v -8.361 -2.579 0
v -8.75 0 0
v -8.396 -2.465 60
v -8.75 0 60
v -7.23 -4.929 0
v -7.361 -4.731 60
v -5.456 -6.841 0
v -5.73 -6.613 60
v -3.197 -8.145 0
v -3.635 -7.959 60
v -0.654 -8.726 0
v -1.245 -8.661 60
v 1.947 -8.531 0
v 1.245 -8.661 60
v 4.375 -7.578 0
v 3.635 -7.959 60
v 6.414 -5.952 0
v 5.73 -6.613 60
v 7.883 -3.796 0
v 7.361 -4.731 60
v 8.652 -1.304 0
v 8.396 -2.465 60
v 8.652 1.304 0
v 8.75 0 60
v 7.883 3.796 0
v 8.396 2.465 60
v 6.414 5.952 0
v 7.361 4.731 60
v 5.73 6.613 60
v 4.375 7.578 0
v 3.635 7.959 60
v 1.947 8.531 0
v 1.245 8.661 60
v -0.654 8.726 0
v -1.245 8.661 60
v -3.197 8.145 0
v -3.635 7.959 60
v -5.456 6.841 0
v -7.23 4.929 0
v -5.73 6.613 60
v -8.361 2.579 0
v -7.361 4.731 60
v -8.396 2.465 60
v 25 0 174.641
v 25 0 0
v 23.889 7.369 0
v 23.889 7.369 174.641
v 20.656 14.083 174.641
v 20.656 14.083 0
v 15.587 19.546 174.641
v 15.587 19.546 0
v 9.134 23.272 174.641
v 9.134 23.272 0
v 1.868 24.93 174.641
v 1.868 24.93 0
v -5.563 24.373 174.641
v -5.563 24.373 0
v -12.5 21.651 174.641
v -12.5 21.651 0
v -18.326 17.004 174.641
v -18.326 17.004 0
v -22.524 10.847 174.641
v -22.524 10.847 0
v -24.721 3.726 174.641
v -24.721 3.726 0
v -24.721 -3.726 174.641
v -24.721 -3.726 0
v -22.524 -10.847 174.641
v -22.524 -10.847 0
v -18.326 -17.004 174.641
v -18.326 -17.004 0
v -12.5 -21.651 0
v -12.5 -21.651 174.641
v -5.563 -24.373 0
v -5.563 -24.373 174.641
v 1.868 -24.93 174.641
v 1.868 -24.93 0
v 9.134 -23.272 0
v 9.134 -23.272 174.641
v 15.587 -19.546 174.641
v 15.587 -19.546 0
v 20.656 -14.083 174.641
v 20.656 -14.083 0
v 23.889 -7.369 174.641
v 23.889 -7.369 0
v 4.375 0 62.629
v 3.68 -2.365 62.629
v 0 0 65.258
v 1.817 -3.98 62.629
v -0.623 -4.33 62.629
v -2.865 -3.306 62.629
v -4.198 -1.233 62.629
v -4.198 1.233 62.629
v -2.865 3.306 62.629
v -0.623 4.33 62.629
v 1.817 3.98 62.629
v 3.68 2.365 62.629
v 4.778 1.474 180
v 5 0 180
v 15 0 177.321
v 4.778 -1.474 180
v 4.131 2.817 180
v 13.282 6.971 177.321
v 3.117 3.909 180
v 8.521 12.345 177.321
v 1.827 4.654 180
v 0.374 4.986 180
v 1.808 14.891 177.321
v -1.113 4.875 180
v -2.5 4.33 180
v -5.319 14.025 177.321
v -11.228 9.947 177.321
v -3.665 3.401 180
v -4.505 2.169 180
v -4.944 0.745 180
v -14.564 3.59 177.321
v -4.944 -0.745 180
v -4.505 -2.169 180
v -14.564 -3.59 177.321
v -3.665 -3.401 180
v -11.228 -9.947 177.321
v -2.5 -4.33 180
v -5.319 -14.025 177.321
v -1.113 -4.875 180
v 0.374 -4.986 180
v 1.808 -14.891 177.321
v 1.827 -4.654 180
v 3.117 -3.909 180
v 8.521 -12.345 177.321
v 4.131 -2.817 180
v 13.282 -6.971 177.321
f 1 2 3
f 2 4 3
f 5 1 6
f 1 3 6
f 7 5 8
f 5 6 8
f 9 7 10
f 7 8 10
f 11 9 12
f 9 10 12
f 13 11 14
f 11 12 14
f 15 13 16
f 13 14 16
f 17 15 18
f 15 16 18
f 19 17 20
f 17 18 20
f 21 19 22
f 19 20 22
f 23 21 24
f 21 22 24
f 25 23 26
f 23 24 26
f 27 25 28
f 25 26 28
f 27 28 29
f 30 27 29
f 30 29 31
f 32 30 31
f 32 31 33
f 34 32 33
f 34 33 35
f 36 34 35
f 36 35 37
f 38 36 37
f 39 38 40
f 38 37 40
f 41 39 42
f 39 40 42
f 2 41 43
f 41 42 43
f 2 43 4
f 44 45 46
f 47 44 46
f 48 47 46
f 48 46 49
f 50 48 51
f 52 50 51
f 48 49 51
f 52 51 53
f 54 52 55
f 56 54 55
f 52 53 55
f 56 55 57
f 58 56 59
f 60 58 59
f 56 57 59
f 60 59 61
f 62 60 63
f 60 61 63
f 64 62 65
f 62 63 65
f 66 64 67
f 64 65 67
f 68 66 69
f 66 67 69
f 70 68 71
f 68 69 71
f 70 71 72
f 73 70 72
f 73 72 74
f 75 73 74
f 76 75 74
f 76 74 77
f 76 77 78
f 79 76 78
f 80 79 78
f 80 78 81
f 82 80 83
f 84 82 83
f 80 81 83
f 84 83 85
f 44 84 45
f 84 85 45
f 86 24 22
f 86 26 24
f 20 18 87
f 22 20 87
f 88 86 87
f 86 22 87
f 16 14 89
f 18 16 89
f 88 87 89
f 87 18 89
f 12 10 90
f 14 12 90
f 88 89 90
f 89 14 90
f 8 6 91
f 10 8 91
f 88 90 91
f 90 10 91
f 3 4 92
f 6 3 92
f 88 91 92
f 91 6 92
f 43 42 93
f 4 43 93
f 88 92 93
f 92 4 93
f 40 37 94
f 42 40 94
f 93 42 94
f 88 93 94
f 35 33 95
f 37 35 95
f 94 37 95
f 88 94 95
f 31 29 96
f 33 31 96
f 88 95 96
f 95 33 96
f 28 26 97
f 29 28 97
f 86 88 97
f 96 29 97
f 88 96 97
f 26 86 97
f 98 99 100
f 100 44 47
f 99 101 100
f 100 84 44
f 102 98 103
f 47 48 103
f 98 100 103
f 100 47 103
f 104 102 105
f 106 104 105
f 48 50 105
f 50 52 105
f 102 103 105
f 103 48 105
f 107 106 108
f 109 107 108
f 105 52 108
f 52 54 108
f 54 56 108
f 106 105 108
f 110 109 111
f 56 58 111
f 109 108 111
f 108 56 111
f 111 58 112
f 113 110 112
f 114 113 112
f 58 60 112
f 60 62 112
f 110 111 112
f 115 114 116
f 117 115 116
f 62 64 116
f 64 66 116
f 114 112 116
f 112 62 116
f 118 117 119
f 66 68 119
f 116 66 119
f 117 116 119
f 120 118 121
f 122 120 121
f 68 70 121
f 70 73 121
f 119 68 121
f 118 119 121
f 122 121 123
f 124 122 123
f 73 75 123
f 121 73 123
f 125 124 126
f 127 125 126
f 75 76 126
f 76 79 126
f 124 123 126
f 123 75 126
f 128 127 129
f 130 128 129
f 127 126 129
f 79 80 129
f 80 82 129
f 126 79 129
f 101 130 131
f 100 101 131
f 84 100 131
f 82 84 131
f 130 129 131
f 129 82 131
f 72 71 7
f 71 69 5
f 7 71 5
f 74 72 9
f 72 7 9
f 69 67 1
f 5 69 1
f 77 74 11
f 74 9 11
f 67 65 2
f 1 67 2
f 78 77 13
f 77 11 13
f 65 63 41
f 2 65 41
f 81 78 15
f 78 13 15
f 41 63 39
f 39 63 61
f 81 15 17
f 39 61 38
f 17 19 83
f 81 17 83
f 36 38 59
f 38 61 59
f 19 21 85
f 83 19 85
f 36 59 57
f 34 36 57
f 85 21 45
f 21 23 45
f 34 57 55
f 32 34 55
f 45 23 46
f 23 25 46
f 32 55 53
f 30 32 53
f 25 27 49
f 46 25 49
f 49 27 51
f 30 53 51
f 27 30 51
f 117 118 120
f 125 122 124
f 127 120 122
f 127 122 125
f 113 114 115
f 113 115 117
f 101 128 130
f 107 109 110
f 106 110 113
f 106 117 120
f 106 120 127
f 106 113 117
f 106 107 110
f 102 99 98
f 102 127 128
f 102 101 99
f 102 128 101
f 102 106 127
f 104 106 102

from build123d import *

# Parameters (mm, degrees)
F0_R     = 25
F1_DEPTH = 180
F2_SIZE2 = 5.3589838486
F2_SIZE  = 20
F4_D     = 17.5
F4_DEPTH = 60
F4_TIP   = 5.2575304165


with BuildPart() as f1:
    # F0 (on Top) → F1 (new body)
    with BuildSketch(Plane.XY):
        Circle(F0_R)
    extrude(amount=F1_DEPTH)

    # F2
    f2_edges = [f1.edges().sort_by_distance(p)[0] for p in [
        (-25, 0, 180),
    ]]
    f2_side = f1.faces().sort_by_distance((0, 0, 180))[0]
    chamfer(f2_edges, length=F2_SIZE, length2=F2_SIZE2, reference=f2_side)

    # F4
    with Locations(Plane(origin=(0, 0, 0), x_dir=(1, 0, 0), z_dir=(0, 0, -1))):
        with Locations((0, 0)):
            Hole(F4_D / 2, depth=F4_DEPTH)
            with Locations((0, 0, -(F4_DEPTH + F4_TIP / 2))):  # 118° drill point
                Cone(0, F4_D / 2, F4_TIP, mode=Mode.SUBTRACT)


solid = f1.part
